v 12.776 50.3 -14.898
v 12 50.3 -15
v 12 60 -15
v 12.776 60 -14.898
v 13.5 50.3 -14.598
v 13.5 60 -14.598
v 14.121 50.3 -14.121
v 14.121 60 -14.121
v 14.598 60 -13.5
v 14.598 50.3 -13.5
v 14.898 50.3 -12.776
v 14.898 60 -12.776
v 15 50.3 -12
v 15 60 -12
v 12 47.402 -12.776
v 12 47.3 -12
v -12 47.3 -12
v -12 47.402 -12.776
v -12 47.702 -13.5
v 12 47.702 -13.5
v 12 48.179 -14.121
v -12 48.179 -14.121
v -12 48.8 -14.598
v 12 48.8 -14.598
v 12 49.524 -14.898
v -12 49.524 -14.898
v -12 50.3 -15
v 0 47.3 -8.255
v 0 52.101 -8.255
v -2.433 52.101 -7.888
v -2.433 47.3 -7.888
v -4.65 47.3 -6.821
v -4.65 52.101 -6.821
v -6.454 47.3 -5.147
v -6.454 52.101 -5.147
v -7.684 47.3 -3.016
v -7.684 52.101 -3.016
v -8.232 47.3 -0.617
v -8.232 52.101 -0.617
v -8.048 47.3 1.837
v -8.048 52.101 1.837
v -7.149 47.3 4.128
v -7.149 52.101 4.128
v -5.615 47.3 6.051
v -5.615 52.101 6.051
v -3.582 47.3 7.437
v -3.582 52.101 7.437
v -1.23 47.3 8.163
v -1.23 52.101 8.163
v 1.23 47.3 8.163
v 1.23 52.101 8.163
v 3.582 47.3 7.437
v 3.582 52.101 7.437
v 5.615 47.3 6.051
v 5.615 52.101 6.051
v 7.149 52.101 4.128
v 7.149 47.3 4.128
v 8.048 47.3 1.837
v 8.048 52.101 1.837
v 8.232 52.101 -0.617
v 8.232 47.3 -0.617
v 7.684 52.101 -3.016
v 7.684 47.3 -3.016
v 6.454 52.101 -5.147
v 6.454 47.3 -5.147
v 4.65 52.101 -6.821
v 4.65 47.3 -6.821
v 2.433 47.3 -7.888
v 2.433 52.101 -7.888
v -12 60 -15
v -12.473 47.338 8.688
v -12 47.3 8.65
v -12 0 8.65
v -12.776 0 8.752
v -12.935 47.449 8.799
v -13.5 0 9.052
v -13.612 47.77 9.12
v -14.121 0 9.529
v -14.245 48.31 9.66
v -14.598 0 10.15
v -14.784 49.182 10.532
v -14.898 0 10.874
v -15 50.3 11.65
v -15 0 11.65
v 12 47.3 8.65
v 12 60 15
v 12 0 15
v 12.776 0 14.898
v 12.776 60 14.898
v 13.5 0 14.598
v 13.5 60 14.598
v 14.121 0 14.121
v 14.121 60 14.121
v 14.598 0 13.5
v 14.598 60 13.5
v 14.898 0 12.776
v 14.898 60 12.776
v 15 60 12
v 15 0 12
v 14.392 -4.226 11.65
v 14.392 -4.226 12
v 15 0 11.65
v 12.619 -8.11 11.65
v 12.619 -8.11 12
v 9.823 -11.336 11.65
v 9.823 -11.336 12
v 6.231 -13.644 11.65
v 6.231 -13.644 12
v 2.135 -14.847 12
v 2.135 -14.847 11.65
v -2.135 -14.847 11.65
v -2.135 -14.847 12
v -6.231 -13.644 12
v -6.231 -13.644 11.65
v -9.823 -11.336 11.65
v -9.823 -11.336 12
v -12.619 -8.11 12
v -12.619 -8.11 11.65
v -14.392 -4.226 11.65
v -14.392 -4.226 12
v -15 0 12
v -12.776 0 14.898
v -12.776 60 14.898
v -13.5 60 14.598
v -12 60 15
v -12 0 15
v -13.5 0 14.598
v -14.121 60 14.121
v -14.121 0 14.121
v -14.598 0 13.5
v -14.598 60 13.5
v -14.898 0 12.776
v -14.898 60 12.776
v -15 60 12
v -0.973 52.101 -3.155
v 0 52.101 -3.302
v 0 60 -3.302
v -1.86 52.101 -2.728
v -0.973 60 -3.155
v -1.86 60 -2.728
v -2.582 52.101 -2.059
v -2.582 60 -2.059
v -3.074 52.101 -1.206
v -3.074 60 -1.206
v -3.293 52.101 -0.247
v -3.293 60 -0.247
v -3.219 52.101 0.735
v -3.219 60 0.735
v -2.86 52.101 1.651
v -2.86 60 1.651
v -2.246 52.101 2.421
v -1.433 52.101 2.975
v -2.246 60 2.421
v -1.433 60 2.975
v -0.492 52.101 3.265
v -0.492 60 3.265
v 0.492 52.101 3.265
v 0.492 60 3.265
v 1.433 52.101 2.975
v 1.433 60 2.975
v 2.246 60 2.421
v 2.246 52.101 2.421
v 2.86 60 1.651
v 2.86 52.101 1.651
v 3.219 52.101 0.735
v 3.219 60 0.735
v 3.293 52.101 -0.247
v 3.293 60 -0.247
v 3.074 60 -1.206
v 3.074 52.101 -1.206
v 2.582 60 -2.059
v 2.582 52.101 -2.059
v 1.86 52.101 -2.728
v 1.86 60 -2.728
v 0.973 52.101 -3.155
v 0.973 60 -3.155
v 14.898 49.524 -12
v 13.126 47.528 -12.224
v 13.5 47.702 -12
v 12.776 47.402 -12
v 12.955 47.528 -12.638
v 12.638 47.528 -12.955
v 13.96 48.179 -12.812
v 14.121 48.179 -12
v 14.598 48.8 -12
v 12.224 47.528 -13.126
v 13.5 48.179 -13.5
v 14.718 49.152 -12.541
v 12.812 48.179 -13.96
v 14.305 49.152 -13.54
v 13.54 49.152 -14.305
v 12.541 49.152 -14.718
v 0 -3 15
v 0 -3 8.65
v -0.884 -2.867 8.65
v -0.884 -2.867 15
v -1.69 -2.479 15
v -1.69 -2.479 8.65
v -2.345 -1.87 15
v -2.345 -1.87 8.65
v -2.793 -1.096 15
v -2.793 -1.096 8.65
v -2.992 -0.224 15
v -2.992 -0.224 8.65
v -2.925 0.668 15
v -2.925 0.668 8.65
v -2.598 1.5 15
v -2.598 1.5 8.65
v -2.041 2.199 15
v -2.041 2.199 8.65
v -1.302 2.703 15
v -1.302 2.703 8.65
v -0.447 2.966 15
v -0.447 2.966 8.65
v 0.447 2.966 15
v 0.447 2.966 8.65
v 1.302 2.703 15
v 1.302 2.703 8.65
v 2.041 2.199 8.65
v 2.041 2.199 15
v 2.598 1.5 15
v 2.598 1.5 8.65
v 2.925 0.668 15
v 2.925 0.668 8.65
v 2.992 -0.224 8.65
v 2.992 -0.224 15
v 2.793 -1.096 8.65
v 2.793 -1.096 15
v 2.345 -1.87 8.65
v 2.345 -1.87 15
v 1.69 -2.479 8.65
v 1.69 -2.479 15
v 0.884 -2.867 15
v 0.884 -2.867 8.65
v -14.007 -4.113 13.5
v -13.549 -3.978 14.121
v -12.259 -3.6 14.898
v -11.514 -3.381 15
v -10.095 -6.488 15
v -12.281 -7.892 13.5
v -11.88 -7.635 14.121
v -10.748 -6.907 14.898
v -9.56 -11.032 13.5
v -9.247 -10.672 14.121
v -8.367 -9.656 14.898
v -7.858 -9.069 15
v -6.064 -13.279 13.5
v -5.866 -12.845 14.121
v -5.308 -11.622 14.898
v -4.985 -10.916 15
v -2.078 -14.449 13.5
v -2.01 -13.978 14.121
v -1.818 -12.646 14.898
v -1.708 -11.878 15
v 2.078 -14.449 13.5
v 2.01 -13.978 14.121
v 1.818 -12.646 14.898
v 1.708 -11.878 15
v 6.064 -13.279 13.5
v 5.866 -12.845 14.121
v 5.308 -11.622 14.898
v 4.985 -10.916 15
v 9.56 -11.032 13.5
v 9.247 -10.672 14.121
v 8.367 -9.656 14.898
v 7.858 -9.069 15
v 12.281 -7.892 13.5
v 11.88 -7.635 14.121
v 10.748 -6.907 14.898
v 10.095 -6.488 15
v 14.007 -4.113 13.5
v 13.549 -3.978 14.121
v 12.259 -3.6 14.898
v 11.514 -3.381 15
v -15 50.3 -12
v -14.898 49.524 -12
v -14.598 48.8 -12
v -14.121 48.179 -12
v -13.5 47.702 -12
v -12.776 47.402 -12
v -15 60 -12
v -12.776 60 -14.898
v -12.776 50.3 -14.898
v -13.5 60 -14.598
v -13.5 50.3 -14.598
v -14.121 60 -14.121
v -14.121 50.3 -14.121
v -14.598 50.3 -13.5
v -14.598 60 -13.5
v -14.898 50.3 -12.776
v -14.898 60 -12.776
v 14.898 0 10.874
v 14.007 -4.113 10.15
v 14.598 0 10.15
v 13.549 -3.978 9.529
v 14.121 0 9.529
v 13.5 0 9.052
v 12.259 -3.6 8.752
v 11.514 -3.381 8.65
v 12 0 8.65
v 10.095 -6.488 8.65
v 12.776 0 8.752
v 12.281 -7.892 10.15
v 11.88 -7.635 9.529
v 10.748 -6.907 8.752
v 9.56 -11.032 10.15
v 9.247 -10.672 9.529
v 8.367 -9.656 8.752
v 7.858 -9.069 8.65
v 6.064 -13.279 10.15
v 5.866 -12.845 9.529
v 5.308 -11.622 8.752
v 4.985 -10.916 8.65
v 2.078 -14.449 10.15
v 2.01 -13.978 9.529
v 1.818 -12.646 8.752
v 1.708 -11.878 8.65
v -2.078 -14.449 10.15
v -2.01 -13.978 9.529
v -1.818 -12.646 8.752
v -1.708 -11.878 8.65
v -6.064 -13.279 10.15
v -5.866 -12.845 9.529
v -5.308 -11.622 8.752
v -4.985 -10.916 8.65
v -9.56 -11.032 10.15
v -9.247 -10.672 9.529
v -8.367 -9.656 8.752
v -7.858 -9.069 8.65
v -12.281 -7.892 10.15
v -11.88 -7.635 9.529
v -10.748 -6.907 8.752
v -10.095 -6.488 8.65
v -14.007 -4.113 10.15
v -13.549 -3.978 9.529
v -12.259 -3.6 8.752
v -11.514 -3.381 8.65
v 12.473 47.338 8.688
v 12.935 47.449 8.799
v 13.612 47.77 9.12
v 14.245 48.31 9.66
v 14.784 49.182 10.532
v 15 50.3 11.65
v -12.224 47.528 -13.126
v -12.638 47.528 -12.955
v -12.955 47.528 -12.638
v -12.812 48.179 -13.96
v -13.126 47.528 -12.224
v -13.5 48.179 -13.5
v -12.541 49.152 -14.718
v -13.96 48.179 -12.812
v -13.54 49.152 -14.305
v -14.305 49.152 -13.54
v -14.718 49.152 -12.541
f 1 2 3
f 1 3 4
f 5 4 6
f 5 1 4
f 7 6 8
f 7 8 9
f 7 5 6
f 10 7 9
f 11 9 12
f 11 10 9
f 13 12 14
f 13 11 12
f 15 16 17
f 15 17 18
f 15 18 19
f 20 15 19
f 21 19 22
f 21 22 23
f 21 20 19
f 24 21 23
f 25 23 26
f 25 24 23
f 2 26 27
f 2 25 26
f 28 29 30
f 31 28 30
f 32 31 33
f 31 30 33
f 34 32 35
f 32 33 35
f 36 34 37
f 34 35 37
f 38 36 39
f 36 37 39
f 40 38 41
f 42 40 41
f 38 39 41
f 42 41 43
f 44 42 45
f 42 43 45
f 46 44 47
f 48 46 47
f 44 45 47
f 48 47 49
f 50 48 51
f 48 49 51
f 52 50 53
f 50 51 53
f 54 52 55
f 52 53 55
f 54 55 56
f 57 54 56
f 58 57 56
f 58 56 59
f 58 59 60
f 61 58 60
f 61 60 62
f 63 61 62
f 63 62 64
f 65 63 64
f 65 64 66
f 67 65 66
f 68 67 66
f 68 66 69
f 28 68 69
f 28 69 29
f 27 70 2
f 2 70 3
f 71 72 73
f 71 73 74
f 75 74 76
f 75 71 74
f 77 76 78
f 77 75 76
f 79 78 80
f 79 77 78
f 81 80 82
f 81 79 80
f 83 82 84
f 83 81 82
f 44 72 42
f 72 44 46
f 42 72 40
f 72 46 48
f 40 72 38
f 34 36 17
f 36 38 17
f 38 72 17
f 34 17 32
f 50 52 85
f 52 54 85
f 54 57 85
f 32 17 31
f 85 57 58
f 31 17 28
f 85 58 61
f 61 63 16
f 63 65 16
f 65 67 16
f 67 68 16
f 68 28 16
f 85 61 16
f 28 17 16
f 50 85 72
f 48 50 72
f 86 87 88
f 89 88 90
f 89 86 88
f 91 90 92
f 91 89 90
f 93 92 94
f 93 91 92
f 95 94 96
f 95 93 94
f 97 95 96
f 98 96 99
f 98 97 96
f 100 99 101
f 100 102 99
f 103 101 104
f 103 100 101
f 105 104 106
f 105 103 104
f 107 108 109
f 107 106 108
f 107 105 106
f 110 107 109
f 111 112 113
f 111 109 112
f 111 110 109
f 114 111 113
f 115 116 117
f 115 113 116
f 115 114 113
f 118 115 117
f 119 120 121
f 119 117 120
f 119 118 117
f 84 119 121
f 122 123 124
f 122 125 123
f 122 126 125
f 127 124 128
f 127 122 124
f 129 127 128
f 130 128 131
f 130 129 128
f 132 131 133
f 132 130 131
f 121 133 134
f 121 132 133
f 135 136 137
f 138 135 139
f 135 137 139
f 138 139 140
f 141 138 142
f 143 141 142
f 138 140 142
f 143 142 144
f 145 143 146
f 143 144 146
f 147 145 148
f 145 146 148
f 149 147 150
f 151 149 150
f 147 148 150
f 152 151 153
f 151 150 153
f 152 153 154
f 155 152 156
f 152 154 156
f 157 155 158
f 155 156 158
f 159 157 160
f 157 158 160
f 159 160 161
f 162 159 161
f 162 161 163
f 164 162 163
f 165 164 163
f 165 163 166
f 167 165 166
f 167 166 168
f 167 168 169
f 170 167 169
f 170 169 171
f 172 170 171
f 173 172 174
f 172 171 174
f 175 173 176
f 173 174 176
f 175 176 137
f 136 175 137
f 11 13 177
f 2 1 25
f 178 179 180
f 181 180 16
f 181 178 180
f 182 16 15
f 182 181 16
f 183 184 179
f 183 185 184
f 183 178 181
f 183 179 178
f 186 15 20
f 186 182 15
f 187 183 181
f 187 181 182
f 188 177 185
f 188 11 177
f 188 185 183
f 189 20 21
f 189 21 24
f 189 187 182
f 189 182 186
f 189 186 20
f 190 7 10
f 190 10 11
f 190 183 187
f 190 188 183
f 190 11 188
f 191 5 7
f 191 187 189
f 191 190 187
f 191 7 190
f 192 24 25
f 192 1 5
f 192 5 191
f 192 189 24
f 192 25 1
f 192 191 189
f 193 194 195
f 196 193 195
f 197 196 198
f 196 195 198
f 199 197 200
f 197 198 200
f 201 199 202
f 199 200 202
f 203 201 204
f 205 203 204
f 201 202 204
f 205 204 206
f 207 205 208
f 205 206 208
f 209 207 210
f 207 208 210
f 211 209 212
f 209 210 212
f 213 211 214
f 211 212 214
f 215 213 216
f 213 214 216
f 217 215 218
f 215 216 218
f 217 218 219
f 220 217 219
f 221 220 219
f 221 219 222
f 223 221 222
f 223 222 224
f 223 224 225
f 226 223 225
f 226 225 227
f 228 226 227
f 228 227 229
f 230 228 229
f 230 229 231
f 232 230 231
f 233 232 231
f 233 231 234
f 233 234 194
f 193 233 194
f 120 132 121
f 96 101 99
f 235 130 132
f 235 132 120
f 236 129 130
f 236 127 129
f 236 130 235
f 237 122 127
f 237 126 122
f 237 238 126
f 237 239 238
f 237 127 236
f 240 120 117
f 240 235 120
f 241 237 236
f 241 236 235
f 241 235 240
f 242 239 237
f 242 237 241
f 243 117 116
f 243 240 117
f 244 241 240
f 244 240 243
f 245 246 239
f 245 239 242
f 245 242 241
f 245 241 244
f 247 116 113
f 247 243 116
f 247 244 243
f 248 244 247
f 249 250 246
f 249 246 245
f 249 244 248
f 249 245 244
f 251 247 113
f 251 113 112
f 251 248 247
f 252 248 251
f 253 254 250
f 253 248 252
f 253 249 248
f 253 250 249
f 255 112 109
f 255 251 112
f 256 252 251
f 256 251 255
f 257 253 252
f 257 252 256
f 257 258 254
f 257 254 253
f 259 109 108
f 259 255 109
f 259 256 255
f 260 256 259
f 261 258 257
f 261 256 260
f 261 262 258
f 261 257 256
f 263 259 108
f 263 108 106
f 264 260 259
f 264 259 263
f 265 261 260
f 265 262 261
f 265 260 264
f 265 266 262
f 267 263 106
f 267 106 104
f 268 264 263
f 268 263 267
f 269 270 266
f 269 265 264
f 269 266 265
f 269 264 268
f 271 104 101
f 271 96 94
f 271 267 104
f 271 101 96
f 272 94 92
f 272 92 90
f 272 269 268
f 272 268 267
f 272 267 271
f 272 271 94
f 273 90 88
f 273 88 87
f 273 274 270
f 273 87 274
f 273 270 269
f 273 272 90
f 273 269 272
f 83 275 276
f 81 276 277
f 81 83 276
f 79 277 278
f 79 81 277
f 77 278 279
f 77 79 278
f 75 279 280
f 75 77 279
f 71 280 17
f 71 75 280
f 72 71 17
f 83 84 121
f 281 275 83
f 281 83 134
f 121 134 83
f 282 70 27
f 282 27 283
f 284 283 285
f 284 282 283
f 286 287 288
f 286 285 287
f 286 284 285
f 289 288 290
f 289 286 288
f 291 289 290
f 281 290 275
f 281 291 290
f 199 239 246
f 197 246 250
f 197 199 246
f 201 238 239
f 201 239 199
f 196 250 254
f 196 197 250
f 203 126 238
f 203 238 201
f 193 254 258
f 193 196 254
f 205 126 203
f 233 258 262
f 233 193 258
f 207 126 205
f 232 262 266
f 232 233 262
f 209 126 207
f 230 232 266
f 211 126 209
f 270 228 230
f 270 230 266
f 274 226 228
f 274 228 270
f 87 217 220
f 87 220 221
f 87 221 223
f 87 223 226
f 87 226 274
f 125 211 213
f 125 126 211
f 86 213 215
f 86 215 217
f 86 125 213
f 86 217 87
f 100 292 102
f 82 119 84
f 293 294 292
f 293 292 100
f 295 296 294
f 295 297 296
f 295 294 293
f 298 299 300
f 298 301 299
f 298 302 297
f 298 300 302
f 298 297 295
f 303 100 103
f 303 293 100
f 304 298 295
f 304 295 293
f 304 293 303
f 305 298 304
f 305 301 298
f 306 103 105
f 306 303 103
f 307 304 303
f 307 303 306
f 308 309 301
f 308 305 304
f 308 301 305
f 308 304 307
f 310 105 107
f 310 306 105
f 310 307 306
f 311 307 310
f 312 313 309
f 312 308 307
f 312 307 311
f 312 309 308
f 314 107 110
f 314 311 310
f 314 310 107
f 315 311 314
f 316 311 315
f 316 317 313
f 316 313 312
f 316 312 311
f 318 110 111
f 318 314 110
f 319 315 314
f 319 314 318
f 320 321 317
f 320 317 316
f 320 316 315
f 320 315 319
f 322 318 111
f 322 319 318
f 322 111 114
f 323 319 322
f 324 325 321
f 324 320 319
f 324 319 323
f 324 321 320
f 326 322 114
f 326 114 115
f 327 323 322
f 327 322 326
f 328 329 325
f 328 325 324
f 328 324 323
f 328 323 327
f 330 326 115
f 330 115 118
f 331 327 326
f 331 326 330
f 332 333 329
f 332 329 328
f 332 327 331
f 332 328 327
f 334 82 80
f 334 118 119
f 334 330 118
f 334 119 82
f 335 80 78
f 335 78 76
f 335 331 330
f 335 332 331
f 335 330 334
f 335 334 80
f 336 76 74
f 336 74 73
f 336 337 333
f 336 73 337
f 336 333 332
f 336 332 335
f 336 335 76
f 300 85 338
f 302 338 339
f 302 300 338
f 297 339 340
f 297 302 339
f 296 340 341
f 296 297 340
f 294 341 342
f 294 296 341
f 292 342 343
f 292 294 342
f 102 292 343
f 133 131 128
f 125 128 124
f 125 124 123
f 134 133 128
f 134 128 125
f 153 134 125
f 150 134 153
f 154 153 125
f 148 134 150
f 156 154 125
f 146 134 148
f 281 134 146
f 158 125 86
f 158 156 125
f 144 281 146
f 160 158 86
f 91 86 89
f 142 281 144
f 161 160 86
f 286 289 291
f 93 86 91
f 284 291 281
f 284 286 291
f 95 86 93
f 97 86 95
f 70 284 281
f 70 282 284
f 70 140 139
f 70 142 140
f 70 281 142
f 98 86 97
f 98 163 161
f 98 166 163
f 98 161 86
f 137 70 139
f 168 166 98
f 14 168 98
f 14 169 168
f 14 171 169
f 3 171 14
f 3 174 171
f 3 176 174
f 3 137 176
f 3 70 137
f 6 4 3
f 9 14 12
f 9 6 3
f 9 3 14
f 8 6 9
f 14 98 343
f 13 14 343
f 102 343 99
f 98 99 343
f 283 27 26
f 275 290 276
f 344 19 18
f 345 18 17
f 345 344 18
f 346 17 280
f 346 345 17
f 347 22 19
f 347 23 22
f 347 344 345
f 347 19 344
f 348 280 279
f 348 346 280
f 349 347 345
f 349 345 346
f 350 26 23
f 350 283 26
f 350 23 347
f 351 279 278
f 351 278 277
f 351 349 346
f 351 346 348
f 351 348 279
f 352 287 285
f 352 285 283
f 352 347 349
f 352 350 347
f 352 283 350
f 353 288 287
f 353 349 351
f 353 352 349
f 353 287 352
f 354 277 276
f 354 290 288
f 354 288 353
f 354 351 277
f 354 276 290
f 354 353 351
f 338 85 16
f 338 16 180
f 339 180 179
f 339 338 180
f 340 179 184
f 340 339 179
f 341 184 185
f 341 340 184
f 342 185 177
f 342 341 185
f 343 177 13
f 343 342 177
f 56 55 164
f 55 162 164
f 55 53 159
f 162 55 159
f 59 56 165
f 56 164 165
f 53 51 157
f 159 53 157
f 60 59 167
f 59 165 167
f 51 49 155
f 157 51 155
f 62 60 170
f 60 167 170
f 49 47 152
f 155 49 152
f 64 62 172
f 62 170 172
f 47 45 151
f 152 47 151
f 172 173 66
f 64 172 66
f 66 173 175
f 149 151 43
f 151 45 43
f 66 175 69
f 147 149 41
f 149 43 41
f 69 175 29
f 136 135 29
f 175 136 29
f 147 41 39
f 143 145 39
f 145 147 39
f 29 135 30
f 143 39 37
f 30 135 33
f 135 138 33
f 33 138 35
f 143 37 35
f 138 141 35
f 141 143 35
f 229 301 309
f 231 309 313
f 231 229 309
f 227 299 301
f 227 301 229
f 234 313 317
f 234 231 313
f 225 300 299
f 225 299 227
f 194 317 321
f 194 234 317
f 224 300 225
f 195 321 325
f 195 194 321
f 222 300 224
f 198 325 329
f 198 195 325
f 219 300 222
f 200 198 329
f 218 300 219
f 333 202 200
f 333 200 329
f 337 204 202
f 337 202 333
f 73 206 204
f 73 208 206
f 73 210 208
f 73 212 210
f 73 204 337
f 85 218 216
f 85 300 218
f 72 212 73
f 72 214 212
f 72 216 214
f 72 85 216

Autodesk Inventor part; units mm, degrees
ref_plane "YZ Plane" through (0, 0, 0) normal (1, 0, 0) x (0, 1, 0)
ref_plane "XZ Plane" through (0, 0, 0) normal (0, 1, 0) x (-1, 0, 0)
ref_plane "XY Plane" through (0, 0, 0) normal (0, 0, 1) x (1, 0, 0)
sketch "Sketch1" plane through (0, 0, 0) normal (0, 0, 1) x (1, 0, 0)
  arc A0 (-15, 0) -> (15, 0) centre (0, 0) ccw
  line L0 (-15, 60) -> (15, 60)
  line L1 (15, 60) -> (15, 0)
  line L2 (-15, 0) -> (-15, 60)
  dimension "d0" = 30
  dimension "d1" = 60
extrude "Extrusion1" add sketch "Sketch1" along normal mid plane 30
sketch "Sketch2" plane through (0, 0, -15) normal (0, 0, -1) x (-1, 0, 0)
  arc A0 (-15, 0) -> (15, 0) centre (0, 0) ccw
  line L0 (15, 0) -> (15, 47.3)
  line L1 (15, 47.3) -> (-15, 47.3)
  line L2 (-15, 47.3) -> (-15, 0)
  line L3 (15, 0) -> (15, 60) projected
  line L4 (-15, 60) -> (-15, 0) projected
  line L5 (15, 60) -> (-15, 60) projected
  dimension "d4" = 12.7
extrude "Extrusion2" cut sketch "Sketch2" against normal blind 23.65 contours L2 L1 L0 A0
fillet "Fillet1" radius 3 11 edges at (-15, 53.65, -15) (15, 53.65, -15) (0, -15, 15) (15, 30, 15) (-15, 30, 15) (0, -15, 8.65) (15, 23.65, 8.65) (-15, 23.65, 8.65) (-15, 47.3, -3.175) (0, 47.3, -15) (15, 47.3, -3.175)
sketch "Sketch3" plane through (-12, 47.3, -15) normal (0, -1, 0) x (1, 0, 0)
  point P0 (12, 15)
  point P1 (12, 15)
hole "Hole1" at (0, 47.3, 0) direction (0, 1, 0) diameter 6.604 end through all counterbore diameter 16.51 counterbore depth 4.8006 clearance for "Hex Head Cap Screw DIN EN 24017" size "M6" standard "DIN"
sketch "Sketch4" plane through (0, 0, 15) normal (0, 0, 1) x (1, 0, 0)
  point P0 (0, 0)
  point P1 (0, 0)
hole "Hole2" at (0, 0, 15) direction (0, 0, -1) diameter 6 end through all
properties part number "NASA-20-ARM-HG-01"
